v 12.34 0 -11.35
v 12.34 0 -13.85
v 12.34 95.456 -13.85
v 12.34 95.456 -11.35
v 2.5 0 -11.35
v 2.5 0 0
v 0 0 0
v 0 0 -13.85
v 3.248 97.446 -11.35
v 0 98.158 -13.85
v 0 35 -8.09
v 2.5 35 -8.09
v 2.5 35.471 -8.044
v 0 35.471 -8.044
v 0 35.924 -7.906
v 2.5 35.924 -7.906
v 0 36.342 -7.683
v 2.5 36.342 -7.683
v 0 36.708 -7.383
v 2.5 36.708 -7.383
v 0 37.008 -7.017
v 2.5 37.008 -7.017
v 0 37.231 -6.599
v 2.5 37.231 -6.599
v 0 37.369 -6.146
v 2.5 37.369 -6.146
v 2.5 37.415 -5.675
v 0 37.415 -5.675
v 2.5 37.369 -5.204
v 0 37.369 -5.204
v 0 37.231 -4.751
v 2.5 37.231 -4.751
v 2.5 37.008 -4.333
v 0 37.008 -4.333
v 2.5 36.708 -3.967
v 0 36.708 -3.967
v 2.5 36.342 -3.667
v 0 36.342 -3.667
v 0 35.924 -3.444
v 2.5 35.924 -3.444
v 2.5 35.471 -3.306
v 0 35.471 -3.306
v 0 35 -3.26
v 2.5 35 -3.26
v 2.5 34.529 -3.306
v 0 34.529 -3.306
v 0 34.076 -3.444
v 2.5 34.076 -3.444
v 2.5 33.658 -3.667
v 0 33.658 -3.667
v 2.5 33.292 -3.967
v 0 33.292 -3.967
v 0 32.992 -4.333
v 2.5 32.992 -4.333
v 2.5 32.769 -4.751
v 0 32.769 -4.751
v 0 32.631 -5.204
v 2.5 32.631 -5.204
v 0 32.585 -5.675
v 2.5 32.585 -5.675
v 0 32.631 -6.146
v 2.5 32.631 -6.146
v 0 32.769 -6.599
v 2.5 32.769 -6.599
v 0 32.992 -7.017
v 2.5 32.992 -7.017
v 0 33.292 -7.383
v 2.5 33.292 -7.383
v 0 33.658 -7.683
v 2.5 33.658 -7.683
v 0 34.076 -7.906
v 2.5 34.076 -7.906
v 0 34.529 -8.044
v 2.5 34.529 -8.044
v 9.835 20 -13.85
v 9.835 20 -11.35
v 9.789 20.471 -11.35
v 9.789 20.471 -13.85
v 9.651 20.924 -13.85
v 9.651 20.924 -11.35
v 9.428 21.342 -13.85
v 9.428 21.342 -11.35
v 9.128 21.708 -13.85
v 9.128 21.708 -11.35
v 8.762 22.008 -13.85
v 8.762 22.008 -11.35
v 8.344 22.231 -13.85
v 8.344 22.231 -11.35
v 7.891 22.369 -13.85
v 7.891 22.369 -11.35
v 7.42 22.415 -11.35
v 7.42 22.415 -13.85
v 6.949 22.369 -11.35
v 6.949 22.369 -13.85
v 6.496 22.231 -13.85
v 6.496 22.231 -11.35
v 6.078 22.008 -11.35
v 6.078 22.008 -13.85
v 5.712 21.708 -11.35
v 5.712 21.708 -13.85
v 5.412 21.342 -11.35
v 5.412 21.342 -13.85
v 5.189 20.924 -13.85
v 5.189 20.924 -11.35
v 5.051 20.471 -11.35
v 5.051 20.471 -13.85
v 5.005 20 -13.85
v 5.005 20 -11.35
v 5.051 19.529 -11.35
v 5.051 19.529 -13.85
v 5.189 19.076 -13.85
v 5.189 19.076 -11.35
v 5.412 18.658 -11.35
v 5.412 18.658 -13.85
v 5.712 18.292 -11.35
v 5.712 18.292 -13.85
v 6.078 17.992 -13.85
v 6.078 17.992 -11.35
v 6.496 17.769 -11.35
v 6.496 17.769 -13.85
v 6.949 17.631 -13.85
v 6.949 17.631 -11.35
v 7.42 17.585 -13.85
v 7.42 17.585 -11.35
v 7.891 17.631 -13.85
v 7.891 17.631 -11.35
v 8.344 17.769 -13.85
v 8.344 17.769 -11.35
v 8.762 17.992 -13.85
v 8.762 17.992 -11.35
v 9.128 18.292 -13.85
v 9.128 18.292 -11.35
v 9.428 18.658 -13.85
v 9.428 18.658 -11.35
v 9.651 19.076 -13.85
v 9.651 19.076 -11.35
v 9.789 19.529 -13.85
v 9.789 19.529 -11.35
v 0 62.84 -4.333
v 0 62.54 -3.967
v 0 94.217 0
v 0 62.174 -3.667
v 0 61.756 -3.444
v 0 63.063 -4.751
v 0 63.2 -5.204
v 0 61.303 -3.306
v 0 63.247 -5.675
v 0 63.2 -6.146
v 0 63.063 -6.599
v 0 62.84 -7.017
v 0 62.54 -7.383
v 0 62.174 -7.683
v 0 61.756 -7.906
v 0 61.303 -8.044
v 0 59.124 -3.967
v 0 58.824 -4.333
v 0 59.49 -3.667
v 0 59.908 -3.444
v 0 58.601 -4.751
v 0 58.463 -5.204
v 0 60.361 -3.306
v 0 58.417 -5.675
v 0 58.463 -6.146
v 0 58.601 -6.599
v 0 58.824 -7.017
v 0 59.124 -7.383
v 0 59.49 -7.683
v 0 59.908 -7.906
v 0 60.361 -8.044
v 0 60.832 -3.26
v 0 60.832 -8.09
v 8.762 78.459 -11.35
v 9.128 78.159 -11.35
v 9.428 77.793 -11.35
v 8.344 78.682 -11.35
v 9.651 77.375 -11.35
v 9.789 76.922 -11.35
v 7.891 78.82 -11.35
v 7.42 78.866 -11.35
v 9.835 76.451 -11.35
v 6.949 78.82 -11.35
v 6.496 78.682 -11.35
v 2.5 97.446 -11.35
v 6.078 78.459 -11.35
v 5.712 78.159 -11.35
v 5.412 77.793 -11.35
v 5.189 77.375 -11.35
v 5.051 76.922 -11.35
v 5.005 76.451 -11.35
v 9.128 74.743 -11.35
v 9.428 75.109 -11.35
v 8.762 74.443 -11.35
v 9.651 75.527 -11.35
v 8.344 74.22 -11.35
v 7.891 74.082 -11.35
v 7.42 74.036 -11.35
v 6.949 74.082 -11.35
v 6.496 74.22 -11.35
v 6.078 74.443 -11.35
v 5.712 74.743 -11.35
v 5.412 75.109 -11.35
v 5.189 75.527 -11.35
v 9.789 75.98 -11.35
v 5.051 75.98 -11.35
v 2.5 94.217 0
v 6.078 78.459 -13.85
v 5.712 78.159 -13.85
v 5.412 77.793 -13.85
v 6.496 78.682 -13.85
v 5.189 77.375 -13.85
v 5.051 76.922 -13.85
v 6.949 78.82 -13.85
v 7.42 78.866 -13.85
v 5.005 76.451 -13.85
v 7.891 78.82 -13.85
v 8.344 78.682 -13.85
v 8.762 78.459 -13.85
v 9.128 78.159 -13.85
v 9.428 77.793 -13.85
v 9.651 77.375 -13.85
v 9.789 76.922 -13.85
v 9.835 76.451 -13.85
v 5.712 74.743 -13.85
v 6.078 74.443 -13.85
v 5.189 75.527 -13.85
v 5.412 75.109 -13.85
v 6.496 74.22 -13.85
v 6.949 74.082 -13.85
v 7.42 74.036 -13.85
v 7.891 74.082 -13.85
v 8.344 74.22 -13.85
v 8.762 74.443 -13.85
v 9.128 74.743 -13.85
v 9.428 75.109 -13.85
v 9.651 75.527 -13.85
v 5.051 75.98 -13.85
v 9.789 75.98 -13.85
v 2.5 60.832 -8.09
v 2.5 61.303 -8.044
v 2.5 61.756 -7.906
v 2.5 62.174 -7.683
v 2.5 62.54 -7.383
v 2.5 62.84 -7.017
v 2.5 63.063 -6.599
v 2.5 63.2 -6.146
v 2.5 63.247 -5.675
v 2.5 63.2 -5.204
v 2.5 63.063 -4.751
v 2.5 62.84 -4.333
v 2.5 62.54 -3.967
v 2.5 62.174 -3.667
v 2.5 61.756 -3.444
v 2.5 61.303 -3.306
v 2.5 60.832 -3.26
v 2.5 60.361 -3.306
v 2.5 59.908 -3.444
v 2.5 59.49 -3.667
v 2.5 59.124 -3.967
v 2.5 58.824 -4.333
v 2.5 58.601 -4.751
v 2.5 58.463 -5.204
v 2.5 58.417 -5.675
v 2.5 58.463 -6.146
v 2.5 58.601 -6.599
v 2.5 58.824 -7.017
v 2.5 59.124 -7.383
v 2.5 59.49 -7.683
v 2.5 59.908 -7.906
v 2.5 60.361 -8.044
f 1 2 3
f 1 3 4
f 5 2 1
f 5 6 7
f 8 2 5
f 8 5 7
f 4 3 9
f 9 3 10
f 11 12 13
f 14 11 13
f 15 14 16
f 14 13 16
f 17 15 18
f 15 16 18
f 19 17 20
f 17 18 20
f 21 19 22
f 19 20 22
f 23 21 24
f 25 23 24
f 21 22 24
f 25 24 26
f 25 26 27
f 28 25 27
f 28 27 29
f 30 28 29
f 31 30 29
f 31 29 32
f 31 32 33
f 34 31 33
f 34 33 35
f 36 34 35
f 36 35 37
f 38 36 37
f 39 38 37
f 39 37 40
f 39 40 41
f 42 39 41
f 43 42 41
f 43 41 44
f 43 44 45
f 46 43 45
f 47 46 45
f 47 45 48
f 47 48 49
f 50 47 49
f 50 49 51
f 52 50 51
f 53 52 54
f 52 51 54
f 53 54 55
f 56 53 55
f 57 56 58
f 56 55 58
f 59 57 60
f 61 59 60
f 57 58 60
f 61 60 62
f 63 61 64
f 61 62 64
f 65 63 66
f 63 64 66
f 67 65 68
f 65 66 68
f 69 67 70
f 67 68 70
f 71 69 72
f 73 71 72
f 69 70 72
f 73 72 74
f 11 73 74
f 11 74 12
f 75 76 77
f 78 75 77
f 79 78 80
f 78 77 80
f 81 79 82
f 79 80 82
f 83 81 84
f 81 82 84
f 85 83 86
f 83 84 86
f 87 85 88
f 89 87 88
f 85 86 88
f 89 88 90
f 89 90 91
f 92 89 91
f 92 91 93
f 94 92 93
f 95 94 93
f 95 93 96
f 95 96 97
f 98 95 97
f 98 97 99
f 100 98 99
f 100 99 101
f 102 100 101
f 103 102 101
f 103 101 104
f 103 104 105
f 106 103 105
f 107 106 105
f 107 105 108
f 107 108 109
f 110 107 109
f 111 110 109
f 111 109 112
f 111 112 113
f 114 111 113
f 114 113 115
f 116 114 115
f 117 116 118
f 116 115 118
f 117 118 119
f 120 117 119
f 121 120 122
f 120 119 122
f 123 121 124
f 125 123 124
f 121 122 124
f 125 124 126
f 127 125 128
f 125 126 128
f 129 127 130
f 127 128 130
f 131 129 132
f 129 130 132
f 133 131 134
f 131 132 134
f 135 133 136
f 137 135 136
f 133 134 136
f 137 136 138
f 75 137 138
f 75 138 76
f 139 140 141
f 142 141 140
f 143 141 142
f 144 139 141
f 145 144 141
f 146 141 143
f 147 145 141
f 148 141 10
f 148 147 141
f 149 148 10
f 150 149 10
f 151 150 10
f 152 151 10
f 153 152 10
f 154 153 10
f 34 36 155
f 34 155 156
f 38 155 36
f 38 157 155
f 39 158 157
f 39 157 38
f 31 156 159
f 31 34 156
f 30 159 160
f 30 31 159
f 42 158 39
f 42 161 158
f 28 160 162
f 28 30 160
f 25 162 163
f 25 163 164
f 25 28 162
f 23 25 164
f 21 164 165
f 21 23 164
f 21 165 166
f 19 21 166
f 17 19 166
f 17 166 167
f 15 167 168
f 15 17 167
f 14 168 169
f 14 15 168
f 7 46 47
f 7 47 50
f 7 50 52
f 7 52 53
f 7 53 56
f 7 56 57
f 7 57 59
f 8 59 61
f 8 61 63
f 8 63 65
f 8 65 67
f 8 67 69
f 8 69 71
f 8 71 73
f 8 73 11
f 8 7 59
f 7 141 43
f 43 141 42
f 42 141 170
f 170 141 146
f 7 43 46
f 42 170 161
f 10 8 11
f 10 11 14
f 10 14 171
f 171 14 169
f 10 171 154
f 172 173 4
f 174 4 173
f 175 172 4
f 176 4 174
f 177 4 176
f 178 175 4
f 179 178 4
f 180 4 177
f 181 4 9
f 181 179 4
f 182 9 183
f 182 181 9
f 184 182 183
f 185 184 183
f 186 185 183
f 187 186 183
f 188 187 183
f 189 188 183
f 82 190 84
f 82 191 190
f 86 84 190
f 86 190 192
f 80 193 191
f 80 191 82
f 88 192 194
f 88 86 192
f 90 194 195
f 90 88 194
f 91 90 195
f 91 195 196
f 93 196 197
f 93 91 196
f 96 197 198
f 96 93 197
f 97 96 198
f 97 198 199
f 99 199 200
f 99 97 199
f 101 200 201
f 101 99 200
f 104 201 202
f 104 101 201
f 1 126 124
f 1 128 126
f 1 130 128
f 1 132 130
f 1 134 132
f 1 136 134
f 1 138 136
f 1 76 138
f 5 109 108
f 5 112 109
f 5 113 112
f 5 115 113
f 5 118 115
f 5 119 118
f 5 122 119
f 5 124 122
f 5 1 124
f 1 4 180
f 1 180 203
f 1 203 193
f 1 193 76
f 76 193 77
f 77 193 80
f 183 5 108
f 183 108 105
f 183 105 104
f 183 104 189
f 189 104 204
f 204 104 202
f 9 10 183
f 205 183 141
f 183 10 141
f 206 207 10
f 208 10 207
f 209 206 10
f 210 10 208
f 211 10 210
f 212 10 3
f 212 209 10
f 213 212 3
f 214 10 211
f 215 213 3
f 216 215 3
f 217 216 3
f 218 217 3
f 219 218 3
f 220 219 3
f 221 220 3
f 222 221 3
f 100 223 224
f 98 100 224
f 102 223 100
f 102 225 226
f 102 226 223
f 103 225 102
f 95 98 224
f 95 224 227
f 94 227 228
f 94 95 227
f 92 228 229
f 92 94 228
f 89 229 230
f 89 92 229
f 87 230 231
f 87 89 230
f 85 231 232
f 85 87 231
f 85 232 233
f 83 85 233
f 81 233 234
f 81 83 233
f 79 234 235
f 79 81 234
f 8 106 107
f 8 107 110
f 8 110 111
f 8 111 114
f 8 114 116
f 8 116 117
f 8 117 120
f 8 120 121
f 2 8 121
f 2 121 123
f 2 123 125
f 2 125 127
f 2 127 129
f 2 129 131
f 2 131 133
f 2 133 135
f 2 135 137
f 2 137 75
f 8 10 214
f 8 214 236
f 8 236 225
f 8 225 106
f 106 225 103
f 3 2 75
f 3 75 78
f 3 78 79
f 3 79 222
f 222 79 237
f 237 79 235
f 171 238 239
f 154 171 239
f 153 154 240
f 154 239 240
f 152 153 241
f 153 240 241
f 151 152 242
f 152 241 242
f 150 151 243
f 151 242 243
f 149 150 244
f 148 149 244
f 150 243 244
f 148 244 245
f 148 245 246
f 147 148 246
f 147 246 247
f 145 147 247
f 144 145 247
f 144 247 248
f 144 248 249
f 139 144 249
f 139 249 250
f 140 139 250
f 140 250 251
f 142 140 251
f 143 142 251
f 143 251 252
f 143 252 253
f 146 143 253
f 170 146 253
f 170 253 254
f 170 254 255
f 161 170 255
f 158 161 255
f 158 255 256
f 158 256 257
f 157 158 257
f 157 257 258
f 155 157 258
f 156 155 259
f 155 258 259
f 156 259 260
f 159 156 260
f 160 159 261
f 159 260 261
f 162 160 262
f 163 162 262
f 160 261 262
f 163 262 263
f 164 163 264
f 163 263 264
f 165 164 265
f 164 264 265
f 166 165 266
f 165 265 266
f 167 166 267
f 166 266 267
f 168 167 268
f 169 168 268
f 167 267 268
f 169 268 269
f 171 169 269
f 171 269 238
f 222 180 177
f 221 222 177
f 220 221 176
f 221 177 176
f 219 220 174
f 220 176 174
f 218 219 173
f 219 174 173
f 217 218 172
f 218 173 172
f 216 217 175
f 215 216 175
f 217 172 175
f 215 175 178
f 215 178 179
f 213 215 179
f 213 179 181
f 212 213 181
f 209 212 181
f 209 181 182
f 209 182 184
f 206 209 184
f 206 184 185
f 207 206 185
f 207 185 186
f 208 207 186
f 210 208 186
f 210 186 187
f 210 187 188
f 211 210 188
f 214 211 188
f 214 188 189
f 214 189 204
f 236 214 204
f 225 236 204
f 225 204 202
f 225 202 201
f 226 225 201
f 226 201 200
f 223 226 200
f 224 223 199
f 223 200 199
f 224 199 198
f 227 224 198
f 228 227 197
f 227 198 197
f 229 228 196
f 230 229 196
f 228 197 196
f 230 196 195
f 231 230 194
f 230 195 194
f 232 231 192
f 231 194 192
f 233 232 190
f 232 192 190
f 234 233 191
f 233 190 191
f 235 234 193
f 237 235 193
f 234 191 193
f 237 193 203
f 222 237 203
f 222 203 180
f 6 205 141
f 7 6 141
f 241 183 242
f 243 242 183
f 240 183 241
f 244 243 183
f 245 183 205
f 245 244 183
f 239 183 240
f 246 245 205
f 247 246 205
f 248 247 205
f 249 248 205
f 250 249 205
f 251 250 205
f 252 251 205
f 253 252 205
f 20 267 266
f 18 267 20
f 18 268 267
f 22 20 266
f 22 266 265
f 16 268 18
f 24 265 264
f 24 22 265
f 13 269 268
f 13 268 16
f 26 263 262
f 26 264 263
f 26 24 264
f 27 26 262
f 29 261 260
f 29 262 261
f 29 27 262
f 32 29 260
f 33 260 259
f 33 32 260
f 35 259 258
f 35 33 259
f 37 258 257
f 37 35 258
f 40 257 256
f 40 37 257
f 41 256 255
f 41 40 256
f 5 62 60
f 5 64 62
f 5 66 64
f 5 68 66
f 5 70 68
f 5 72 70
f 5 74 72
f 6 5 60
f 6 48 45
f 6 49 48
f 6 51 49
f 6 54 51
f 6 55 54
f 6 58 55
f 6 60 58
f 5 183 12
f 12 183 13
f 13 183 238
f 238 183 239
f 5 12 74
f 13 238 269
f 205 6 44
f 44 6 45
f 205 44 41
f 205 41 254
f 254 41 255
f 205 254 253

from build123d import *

# Parameters (mm, degrees)
BOSS_EXTRUDE1_DEPTH = 100
CUT_EXTRUDE5_DEPTH  = 16
CUT_EXTRUDE6_DEPTH  = 16
SKETCH8_R           = 2.415
CUT_EXTRUDE7_DEPTH  = 16
SKETCH6_R           = 2.415
CUT_EXTRUDE8_DEPTH  = 16


with BuildPart() as part:
    # Sketch1 → Boss-Extrude1 (new body)
    with BuildSketch(Plane(origin=(0, 0, 0), x_dir=(1, 0, 0), z_dir=(0, 1, 0))):
        Polygon((0, 0), (0, 13.85), (12.34, 13.85), (12.34, 11.35), (2.5, 11.35), (2.5, 0), align=None)
    extrude(amount=BOSS_EXTRUDE1_DEPTH)

    # Sketch5 → Cut-Extrude5 (cut)
    with BuildSketch(Plane(origin=(0, 0, -13.85), x_dir=(-1, 0, 0), z_dir=(0, 0, -1))):
        Polygon((0, 98.157512876), (-15.02502343, 99.39968578), (-15.02502343, 94.867790228), align=None)
    extrude(amount=-CUT_EXTRUDE5_DEPTH, mode=Mode.SUBTRACT)


with BuildPart() as body_2:
    # of the pieces the cut leaves, the one that is kept (cut_extrude5_keep)
    add(part.part.solids().sort_by_distance((0, 0, 0))[0])

    # Sketch4 → Cut-Extrude6 (cut)
    with BuildSketch(Plane.ZY):
        Polygon((-13.849977668, 98.157512876), (8.264271821, 91.866448074), (8.264271821, 98.157512876), align=None)
    extrude(amount=-CUT_EXTRUDE6_DEPTH, mode=Mode.SUBTRACT)

    # Sketch8 → Cut-Extrude7 (cut)
    with BuildSketch(Plane(origin=(2.5, 0, 0), x_dir=(0, 0, -1), z_dir=(1, 0, 0))):
        with Locations((5.675, 35)):
            Circle(SKETCH8_R)
        with Locations((5.675, 60.83189408)):
            Circle(SKETCH8_R)
    extrude(amount=-CUT_EXTRUDE7_DEPTH, mode=Mode.SUBTRACT)

    # Sketch6 → Cut-Extrude8 (cut)
    with BuildSketch(Plane.XY.offset(-11.35)):
        with Locations((7.42, 20)):
            Circle(SKETCH6_R)
        with Locations((7.42, 76.450996936)):
            Circle(SKETCH6_R)
    extrude(amount=-CUT_EXTRUDE8_DEPTH, mode=Mode.SUBTRACT)


solid = body_2.part
